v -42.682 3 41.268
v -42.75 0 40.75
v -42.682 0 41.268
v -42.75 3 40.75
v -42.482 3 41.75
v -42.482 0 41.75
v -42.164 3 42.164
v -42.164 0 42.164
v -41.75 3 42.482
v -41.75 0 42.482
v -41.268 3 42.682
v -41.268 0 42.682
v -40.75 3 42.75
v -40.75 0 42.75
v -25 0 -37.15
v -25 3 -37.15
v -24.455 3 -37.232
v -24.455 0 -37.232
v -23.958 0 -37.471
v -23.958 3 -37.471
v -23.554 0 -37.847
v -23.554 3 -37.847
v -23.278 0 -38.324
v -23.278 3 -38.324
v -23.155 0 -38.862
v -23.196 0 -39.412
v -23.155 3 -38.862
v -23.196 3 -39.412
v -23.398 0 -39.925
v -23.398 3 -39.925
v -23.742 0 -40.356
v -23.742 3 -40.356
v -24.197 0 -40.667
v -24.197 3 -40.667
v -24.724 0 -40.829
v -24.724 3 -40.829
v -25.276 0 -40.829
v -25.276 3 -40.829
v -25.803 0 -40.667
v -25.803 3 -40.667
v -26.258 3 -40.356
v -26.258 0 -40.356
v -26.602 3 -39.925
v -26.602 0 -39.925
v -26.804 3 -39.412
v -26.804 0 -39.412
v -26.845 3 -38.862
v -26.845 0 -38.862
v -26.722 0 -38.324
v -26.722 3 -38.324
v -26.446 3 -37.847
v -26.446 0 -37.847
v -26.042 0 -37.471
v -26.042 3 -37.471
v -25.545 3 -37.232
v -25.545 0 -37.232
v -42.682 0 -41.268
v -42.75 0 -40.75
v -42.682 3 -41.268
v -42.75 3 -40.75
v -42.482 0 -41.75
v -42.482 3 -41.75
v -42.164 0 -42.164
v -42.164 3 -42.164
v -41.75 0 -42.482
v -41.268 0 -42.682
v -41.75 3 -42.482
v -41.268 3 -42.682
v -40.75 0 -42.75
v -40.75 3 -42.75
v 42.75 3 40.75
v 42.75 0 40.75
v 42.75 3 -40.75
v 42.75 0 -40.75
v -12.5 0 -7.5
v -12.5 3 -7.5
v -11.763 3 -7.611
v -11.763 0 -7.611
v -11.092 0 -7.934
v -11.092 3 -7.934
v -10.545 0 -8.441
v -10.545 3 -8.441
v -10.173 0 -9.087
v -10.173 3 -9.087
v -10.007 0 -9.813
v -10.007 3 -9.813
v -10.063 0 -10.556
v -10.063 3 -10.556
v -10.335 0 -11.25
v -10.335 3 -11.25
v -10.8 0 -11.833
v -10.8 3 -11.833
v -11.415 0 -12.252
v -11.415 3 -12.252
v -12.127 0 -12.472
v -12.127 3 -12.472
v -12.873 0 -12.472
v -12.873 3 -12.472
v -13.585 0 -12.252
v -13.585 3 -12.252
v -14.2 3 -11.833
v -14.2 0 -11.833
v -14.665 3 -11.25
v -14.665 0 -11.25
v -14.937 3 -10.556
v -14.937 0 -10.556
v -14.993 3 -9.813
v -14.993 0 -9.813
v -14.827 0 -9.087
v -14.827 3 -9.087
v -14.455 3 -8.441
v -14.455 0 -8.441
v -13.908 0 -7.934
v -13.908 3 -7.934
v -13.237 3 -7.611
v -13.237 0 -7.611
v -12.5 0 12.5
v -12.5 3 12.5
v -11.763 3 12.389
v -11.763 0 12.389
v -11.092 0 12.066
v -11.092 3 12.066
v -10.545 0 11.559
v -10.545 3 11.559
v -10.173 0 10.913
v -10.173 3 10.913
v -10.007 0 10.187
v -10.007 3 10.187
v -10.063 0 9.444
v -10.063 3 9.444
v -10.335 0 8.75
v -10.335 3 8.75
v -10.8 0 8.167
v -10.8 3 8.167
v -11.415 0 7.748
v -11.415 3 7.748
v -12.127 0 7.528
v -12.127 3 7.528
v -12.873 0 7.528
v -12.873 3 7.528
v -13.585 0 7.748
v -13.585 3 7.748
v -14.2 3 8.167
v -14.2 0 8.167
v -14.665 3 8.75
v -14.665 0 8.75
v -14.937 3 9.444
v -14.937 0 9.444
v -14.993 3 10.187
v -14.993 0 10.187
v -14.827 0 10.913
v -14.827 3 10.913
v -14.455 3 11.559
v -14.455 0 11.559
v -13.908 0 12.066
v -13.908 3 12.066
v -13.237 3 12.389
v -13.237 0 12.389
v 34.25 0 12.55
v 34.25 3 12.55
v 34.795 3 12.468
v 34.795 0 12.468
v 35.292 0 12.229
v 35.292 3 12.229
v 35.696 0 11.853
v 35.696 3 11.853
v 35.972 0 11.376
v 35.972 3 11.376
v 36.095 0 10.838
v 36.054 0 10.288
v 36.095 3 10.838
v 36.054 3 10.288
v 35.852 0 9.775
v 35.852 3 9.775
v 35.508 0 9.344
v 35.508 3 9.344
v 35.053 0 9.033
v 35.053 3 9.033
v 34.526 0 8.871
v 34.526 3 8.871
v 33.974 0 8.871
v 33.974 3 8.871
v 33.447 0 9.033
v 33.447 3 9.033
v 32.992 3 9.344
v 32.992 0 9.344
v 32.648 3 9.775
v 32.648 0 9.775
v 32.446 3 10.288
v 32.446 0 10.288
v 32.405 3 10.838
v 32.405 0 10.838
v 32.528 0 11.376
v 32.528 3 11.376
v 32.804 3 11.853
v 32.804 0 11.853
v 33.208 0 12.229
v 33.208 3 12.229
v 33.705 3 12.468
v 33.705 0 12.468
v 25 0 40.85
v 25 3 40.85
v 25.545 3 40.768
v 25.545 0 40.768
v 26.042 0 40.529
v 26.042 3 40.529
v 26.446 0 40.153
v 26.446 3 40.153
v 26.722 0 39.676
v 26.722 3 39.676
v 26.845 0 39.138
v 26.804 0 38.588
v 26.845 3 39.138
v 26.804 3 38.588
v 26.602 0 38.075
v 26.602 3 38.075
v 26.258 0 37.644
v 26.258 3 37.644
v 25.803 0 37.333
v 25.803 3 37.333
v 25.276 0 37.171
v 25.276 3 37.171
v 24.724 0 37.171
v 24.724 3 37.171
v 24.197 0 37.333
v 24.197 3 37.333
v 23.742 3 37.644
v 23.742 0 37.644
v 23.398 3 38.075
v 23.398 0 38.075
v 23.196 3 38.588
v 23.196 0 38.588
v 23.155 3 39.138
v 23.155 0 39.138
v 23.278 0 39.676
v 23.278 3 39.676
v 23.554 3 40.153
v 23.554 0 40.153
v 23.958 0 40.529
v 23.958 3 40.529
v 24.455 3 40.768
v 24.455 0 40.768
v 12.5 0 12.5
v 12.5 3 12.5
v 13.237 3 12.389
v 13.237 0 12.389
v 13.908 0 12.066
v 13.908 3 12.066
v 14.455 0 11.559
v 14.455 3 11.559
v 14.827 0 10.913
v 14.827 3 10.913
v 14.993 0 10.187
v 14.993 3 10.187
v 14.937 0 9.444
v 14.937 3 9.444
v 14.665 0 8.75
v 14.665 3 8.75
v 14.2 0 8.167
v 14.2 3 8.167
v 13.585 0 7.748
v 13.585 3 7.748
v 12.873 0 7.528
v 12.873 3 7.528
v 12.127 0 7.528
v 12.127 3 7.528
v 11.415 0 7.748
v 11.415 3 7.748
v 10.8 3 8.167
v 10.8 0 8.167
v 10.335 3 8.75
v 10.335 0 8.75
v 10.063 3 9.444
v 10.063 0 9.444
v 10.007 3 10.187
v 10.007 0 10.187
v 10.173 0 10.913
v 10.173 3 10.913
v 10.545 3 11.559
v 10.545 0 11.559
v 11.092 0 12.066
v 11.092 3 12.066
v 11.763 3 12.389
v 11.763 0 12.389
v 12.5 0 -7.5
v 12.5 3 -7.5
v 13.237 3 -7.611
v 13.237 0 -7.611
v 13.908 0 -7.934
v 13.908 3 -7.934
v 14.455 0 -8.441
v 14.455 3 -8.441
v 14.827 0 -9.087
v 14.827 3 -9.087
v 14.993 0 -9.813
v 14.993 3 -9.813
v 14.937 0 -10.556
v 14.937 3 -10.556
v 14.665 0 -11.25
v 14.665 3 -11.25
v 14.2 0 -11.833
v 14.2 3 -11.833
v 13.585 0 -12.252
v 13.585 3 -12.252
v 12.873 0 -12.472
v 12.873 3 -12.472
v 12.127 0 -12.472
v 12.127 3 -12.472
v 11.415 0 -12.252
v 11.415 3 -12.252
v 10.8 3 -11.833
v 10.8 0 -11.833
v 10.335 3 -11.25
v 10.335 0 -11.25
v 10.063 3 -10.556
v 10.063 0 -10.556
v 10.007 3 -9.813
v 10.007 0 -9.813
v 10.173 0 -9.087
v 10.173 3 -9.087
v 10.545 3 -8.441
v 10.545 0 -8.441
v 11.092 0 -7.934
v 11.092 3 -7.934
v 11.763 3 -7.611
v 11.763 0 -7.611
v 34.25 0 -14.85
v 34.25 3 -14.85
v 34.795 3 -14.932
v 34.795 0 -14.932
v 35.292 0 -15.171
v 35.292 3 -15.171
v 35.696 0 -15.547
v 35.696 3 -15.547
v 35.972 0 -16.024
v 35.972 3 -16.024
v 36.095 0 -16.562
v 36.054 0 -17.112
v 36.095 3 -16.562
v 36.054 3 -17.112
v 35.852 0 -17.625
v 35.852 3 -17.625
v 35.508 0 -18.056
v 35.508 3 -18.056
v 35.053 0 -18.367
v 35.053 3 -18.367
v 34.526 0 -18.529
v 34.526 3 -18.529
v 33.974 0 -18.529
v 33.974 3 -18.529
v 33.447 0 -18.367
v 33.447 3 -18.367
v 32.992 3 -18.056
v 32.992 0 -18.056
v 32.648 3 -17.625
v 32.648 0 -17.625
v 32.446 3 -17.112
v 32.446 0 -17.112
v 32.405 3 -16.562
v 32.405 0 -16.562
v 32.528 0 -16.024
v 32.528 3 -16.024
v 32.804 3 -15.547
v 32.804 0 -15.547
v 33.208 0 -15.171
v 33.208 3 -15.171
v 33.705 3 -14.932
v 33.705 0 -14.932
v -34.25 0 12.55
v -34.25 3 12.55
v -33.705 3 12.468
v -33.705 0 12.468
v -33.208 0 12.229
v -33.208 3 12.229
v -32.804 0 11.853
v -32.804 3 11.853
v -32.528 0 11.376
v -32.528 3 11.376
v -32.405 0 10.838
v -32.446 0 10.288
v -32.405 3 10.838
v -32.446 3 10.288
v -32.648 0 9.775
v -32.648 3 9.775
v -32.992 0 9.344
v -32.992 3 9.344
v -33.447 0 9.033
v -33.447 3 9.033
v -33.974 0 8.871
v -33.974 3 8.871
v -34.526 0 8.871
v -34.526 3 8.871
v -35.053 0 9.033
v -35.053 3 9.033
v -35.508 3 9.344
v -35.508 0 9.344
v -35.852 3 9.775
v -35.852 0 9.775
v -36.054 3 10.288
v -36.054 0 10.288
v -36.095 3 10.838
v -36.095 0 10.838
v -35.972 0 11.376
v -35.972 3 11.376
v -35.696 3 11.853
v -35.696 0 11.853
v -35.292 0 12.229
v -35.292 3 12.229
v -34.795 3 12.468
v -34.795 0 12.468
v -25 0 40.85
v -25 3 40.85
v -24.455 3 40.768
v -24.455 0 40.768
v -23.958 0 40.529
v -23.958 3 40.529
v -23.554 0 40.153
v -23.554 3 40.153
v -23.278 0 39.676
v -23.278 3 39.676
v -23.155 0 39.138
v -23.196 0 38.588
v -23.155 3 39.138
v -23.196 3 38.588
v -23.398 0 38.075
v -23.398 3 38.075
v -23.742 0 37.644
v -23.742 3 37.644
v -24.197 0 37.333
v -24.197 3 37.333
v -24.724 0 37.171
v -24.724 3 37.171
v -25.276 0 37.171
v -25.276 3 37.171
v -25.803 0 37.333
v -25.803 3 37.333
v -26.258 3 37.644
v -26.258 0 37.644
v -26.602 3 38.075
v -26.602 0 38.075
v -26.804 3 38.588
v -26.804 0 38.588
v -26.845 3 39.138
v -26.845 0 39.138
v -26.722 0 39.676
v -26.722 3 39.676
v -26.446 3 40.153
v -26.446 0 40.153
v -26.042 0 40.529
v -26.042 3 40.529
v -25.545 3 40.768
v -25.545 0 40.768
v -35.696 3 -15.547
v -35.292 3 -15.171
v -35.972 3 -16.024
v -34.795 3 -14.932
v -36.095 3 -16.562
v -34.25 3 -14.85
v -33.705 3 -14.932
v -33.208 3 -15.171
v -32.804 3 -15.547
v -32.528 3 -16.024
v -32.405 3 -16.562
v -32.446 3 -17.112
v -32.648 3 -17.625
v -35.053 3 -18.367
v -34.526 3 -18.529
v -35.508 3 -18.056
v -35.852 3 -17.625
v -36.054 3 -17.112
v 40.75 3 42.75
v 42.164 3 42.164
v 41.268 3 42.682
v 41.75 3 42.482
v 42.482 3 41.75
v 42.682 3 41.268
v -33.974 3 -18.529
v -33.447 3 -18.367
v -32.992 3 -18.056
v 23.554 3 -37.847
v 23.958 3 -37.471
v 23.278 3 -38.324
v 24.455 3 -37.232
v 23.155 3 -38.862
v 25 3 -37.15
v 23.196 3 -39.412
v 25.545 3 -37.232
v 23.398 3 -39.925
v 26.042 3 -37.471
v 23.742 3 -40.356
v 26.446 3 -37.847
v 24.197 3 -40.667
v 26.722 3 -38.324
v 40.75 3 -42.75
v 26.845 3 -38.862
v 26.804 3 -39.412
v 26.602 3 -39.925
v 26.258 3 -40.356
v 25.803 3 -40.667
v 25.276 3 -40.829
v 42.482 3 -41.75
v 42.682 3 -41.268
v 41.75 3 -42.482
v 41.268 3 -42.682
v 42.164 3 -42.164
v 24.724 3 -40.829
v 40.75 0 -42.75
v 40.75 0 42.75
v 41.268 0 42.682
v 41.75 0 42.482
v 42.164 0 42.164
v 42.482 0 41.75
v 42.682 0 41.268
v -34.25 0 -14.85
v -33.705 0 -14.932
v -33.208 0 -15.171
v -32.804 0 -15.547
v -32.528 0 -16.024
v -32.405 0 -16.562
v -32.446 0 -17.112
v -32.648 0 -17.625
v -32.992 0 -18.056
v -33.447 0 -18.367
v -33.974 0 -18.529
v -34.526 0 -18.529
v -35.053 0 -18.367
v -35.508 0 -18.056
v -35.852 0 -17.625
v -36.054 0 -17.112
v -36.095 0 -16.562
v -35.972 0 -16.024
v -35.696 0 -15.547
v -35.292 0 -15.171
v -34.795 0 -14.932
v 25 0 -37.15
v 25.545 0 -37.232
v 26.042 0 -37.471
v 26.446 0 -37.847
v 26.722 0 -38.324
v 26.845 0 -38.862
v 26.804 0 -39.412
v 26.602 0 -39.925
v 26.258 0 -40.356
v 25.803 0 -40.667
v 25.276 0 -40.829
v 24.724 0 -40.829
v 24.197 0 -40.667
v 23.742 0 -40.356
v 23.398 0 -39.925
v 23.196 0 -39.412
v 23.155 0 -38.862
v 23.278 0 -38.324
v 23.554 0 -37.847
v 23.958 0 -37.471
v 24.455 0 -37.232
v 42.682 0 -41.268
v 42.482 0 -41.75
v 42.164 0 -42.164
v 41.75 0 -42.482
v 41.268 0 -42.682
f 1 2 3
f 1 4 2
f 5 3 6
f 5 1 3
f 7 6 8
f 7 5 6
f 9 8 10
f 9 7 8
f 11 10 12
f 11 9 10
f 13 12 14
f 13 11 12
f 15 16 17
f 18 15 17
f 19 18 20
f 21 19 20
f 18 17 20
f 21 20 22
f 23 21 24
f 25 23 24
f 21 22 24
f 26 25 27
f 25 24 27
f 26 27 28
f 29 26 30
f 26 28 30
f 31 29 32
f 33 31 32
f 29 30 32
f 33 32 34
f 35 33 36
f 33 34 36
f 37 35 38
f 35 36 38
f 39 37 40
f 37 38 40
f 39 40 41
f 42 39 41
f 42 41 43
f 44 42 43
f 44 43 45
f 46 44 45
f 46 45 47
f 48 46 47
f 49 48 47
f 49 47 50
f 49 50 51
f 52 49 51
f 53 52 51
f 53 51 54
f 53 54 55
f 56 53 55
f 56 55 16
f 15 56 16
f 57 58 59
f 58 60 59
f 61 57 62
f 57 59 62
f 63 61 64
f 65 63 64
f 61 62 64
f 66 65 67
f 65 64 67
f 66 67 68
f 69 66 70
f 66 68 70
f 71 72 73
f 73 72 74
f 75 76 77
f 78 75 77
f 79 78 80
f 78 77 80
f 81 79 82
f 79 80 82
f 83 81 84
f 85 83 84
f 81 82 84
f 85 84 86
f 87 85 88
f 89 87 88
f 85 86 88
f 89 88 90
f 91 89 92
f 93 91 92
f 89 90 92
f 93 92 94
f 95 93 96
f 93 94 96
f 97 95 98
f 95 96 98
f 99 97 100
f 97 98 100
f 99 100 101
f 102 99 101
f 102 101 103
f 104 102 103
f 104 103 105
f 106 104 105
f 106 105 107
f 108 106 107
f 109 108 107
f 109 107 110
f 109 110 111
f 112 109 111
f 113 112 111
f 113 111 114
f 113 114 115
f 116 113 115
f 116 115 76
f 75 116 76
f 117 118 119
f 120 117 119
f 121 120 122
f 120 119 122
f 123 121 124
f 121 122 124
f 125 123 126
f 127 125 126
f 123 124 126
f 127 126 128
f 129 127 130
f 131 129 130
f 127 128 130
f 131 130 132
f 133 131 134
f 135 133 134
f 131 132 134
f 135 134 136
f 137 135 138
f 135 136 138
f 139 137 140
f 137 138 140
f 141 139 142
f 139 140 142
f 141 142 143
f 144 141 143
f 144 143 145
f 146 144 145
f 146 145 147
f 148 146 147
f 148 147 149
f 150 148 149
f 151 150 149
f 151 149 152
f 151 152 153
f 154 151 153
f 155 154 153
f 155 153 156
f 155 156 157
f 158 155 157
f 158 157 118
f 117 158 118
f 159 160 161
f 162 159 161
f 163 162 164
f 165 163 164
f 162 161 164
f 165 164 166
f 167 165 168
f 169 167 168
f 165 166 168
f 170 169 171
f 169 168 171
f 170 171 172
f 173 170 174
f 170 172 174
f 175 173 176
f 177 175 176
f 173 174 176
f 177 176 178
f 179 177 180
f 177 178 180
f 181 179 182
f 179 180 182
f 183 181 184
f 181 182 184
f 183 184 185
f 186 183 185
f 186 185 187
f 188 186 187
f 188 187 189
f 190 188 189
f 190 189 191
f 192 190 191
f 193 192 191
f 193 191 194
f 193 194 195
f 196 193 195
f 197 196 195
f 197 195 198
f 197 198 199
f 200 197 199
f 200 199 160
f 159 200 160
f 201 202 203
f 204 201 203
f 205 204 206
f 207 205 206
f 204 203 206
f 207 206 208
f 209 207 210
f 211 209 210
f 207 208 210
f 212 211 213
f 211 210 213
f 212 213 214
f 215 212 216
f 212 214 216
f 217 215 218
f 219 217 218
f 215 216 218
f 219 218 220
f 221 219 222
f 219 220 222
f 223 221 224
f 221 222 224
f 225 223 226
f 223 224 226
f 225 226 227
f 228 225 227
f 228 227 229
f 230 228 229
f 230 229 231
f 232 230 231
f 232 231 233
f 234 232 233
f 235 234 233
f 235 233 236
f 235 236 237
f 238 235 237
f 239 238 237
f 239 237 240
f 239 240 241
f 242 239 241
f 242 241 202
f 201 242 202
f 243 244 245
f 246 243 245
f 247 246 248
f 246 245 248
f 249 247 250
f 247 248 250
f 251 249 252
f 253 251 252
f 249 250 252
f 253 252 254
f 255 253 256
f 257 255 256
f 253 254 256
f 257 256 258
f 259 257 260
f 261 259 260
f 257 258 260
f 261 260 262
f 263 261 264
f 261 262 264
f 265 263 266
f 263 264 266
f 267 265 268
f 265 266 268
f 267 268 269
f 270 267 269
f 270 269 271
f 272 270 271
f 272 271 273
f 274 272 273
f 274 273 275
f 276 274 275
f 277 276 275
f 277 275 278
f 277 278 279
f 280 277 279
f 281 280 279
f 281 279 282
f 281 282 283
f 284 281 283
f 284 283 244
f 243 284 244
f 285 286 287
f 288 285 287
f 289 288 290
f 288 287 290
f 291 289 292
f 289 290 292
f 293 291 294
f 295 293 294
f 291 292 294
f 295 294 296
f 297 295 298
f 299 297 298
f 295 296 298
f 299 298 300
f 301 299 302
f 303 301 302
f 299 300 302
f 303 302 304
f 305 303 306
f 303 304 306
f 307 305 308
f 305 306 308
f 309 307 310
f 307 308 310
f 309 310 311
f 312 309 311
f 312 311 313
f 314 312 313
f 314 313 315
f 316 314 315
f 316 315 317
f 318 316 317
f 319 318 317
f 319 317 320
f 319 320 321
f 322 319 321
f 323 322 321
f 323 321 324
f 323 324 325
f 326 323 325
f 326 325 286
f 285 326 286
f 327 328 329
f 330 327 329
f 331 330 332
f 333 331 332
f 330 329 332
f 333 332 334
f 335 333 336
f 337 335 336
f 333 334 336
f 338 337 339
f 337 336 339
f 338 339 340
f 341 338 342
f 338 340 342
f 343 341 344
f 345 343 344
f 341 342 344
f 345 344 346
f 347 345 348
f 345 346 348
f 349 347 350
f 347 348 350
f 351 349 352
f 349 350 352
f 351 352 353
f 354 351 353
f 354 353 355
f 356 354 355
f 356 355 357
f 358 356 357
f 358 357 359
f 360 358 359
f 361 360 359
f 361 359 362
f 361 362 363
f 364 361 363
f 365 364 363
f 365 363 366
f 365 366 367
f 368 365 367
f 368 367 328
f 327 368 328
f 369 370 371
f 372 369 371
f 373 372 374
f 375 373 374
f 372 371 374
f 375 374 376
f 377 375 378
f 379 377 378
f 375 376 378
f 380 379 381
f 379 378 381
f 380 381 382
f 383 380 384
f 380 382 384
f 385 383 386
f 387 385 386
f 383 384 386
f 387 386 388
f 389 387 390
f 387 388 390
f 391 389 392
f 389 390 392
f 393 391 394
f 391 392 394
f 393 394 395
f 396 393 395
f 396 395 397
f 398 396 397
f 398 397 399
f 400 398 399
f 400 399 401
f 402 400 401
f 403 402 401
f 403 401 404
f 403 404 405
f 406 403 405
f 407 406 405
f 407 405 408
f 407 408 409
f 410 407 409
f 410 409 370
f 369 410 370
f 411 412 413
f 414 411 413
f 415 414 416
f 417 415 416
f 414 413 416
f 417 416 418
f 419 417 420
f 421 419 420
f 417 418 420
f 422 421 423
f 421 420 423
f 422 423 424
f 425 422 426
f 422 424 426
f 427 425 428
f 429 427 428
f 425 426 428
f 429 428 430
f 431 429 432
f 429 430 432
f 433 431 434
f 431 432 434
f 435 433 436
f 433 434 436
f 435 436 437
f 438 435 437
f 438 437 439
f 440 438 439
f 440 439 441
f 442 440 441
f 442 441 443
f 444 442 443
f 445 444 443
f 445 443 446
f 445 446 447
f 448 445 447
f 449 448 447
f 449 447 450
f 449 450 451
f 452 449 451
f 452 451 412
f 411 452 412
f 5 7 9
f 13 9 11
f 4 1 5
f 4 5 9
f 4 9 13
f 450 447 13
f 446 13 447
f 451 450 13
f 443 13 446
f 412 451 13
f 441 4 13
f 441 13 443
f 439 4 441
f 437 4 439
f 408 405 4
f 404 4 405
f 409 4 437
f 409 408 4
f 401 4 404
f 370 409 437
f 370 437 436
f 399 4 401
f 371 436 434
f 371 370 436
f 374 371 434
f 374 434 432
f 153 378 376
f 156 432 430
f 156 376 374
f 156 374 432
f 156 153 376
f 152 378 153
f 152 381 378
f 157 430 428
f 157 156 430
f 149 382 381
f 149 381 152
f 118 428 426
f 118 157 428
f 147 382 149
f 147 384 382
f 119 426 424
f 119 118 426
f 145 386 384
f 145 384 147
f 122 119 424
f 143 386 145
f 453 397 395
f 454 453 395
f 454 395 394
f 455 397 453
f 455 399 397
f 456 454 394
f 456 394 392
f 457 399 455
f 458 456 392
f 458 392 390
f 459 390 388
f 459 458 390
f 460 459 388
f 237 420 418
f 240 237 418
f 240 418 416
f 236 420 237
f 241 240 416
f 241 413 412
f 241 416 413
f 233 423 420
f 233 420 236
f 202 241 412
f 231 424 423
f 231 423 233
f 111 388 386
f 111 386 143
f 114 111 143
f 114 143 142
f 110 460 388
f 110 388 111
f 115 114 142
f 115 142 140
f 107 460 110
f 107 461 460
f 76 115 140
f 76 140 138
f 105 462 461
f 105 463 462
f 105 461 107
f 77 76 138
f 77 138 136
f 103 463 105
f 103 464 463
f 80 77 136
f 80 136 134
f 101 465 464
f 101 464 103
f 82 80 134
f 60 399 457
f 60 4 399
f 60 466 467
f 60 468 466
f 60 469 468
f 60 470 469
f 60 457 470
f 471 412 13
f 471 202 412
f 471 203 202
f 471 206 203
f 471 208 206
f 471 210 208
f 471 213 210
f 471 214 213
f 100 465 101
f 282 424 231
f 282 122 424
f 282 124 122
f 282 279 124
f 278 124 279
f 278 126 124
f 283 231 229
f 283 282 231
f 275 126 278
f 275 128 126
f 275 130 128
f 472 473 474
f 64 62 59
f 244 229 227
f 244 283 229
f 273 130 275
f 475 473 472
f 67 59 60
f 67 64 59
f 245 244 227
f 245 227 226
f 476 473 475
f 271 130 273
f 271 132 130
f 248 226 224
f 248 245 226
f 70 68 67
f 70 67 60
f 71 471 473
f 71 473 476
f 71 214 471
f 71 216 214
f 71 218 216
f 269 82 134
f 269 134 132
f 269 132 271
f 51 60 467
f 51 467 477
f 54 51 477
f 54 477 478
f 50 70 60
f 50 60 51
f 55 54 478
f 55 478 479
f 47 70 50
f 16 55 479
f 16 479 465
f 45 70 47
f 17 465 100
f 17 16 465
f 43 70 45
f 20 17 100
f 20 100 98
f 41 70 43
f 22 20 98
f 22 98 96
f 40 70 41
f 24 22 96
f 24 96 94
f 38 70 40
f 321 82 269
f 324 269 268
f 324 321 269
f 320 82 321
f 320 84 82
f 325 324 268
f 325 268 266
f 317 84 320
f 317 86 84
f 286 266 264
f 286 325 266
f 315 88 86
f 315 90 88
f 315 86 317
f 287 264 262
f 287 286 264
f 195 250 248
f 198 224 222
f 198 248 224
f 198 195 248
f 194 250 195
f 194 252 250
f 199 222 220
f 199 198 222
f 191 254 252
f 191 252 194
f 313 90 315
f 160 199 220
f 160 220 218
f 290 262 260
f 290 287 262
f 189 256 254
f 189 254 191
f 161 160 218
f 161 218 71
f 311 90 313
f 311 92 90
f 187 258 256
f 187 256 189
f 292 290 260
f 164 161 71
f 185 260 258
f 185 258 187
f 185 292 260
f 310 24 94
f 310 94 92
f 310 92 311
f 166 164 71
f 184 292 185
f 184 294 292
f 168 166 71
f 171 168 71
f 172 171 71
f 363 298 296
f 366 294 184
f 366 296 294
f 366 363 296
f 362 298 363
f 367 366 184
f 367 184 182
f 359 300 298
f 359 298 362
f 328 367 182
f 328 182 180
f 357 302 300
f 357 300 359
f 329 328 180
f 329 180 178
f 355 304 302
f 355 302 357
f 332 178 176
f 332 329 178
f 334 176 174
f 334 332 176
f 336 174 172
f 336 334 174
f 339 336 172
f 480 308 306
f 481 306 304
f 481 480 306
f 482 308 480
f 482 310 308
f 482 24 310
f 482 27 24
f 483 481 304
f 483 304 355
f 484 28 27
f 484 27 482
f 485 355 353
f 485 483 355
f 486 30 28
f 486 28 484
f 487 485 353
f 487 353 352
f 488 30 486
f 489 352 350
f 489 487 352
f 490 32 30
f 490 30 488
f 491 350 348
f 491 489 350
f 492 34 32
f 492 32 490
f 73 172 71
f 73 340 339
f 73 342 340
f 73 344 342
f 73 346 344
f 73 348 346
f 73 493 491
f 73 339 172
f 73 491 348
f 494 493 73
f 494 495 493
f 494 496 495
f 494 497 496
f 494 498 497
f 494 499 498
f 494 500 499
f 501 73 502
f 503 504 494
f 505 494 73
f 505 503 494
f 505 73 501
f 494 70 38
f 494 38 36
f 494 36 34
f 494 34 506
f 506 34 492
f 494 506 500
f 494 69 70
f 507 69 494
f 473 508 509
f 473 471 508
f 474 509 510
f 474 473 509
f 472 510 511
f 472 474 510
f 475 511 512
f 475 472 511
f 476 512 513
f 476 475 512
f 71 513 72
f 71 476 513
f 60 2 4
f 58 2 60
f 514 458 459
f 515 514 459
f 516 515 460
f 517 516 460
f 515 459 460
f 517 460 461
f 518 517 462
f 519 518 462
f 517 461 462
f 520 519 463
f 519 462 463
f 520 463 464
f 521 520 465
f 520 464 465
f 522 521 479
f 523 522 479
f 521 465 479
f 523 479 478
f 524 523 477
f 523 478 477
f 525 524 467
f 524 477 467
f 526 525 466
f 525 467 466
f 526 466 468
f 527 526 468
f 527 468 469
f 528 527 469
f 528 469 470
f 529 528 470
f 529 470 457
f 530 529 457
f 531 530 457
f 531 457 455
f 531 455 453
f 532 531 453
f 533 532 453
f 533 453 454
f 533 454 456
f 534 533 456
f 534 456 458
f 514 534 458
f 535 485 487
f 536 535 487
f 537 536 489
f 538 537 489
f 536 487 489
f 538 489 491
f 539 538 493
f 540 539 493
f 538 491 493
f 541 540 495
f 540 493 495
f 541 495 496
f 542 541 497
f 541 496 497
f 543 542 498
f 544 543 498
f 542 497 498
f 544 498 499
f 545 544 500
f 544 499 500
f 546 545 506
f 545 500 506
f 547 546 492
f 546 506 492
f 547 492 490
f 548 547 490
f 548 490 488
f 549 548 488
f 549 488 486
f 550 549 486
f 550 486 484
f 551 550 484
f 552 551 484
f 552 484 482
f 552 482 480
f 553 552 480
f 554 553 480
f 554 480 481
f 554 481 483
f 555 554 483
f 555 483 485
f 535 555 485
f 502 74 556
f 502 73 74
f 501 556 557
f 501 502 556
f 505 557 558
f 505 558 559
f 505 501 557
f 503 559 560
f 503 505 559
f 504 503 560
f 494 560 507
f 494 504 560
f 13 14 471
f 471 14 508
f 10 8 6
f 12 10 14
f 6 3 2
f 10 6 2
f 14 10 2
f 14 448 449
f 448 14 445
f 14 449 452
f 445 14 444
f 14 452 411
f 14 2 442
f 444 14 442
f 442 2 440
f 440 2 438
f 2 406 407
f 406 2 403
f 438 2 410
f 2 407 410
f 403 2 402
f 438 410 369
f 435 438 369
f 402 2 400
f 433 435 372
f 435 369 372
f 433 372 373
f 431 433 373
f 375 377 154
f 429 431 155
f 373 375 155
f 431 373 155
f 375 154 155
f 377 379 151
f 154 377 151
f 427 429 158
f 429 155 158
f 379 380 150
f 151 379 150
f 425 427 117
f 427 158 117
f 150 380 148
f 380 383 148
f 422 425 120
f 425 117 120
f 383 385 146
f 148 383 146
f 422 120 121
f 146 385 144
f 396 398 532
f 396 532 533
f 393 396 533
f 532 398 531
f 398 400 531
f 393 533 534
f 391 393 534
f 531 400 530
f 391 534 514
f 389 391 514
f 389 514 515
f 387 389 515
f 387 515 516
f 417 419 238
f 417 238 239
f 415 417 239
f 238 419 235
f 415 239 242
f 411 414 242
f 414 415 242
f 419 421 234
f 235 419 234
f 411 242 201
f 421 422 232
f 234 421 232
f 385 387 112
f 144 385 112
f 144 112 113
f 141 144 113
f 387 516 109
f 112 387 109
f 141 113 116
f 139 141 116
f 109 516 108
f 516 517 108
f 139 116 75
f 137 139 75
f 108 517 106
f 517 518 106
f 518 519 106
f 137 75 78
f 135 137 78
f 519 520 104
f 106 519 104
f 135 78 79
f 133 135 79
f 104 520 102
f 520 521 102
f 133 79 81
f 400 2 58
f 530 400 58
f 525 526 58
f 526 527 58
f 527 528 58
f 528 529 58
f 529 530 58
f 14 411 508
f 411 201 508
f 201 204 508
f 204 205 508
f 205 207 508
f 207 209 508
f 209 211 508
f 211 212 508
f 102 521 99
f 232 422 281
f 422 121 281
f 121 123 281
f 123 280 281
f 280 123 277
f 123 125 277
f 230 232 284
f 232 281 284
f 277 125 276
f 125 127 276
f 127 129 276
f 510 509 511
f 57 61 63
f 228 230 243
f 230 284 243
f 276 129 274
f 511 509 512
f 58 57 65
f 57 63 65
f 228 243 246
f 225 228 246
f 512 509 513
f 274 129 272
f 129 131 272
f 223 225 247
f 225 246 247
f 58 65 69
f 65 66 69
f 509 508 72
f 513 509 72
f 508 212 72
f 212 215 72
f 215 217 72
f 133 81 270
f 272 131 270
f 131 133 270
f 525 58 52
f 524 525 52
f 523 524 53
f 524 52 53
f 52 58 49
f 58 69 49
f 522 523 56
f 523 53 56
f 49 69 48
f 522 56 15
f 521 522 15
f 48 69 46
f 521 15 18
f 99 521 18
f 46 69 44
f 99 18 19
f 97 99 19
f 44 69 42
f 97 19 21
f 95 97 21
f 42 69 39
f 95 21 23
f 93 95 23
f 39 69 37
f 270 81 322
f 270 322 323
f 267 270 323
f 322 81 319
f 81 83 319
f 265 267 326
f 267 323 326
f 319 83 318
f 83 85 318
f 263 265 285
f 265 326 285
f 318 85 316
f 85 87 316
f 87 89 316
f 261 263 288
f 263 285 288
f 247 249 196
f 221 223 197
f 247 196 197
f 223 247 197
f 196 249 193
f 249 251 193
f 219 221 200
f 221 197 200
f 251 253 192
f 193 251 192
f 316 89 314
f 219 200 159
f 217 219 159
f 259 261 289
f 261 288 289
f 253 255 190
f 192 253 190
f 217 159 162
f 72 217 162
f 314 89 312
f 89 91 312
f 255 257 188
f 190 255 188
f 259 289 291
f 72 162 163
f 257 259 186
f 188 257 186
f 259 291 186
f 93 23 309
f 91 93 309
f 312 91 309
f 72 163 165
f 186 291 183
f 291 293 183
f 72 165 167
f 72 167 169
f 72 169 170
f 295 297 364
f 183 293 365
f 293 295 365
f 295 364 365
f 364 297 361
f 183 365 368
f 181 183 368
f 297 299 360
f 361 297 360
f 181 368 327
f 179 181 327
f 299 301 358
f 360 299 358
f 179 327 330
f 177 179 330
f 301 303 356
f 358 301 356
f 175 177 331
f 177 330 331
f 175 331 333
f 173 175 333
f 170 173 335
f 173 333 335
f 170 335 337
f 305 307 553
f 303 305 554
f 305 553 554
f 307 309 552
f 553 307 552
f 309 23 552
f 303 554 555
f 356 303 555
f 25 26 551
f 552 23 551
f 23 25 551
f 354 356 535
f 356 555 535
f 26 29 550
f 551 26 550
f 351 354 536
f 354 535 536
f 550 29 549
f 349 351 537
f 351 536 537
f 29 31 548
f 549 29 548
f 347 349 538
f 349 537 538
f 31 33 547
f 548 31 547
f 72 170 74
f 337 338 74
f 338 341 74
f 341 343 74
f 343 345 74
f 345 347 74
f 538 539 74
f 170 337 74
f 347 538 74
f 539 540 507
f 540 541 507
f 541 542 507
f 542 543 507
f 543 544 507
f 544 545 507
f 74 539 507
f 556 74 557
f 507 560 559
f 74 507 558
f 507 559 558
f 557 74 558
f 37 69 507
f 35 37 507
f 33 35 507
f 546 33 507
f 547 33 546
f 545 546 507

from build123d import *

# Parameters (mm, degrees)
SKETCH1_W           = 85.5
SKETCH1_H           = 85.5
BOSS_EXTRUDE1_DEPTH = 3
FILLET1_R           = 2
SKETCH3_R           = 1.85
CUT_EXTRUDE1_DEPTH  = 10
SKETCH4_R           = 2.5
SKETCH4_R_2         = 1.85
CUT_EXTRUDE2_DEPTH  = 10


with BuildPart() as part:
    # Sketch1 → Boss-Extrude1 (new body)
    with BuildSketch(Plane(origin=(0, 0, 0), x_dir=(1, 0, 0), z_dir=(0, 1, 0))):
        Rectangle(SKETCH1_W, SKETCH1_H)
    extrude(amount=BOSS_EXTRUDE1_DEPTH)

    # Fillet1
    fillet1_edges = [part.edges().sort_by_distance(p)[0] for p in [
        (-42.75, 1.5, -42.75),
        (42.75, 1.5, -42.75),
        (42.75, 1.5, 42.75),
        (-42.75, 1.5, 42.75),
    ]]
    fillet(fillet1_edges, radius=FILLET1_R)

    # Sketch3 → Cut-Extrude1 (cut)
    with BuildSketch(Plane(origin=(0, 3, 0), x_dir=(1, 0, 0), z_dir=(0, 1, 0))):
        with Locations(Location((-25, 39, 0), (0, 0, 270))):
            Circle(SKETCH3_R)
        with Locations(Location((25, 39, 0), (0, 0, 270))):
            Circle(SKETCH3_R)
        with Locations(Location((25, -39, 0), (0, 0, 270))):
            Circle(SKETCH3_R)
        with Locations(Location((-25, -39, 0), (0, 0, 270))):
            Circle(SKETCH3_R)
    extrude(amount=-CUT_EXTRUDE1_DEPTH, mode=Mode.SUBTRACT)

    # Sketch4 → Cut-Extrude2 (cut)
    with BuildSketch(Plane(origin=(0, 3, 0), x_dir=(1, 0, 0), z_dir=(0, 1, 0))):
        with Locations(Location((-12.5, 10, 0), (0, 0, 270))):
            Circle(SKETCH4_R)
        with Locations(Location((-12.5, -10, 0), (0, 0, 270))):
            Circle(SKETCH4_R)
        with Locations(Location((12.5, 10, 0), (0, 0, 270))):
            Circle(SKETCH4_R)
        with Locations(Location((12.5, -10, 0), (0, 0, 270))):
            Circle(SKETCH4_R)
        with Locations(Location((-34.25, 16.7, 0), (0, 0, 270))):
            Circle(SKETCH4_R_2)
        with Locations(Location((-34.25, -10.7, 0), (0, 0, 270))):
            Circle(SKETCH4_R_2)
        with Locations(Location((34.25, -10.7, 0), (0, 0, 270))):
            Circle(SKETCH4_R_2)
        with Locations(Location((34.25, 16.7, 0), (0, 0, 270))):
            Circle(SKETCH4_R_2)
    extrude(amount=-CUT_EXTRUDE2_DEPTH, mode=Mode.SUBTRACT)


solid = part.part
